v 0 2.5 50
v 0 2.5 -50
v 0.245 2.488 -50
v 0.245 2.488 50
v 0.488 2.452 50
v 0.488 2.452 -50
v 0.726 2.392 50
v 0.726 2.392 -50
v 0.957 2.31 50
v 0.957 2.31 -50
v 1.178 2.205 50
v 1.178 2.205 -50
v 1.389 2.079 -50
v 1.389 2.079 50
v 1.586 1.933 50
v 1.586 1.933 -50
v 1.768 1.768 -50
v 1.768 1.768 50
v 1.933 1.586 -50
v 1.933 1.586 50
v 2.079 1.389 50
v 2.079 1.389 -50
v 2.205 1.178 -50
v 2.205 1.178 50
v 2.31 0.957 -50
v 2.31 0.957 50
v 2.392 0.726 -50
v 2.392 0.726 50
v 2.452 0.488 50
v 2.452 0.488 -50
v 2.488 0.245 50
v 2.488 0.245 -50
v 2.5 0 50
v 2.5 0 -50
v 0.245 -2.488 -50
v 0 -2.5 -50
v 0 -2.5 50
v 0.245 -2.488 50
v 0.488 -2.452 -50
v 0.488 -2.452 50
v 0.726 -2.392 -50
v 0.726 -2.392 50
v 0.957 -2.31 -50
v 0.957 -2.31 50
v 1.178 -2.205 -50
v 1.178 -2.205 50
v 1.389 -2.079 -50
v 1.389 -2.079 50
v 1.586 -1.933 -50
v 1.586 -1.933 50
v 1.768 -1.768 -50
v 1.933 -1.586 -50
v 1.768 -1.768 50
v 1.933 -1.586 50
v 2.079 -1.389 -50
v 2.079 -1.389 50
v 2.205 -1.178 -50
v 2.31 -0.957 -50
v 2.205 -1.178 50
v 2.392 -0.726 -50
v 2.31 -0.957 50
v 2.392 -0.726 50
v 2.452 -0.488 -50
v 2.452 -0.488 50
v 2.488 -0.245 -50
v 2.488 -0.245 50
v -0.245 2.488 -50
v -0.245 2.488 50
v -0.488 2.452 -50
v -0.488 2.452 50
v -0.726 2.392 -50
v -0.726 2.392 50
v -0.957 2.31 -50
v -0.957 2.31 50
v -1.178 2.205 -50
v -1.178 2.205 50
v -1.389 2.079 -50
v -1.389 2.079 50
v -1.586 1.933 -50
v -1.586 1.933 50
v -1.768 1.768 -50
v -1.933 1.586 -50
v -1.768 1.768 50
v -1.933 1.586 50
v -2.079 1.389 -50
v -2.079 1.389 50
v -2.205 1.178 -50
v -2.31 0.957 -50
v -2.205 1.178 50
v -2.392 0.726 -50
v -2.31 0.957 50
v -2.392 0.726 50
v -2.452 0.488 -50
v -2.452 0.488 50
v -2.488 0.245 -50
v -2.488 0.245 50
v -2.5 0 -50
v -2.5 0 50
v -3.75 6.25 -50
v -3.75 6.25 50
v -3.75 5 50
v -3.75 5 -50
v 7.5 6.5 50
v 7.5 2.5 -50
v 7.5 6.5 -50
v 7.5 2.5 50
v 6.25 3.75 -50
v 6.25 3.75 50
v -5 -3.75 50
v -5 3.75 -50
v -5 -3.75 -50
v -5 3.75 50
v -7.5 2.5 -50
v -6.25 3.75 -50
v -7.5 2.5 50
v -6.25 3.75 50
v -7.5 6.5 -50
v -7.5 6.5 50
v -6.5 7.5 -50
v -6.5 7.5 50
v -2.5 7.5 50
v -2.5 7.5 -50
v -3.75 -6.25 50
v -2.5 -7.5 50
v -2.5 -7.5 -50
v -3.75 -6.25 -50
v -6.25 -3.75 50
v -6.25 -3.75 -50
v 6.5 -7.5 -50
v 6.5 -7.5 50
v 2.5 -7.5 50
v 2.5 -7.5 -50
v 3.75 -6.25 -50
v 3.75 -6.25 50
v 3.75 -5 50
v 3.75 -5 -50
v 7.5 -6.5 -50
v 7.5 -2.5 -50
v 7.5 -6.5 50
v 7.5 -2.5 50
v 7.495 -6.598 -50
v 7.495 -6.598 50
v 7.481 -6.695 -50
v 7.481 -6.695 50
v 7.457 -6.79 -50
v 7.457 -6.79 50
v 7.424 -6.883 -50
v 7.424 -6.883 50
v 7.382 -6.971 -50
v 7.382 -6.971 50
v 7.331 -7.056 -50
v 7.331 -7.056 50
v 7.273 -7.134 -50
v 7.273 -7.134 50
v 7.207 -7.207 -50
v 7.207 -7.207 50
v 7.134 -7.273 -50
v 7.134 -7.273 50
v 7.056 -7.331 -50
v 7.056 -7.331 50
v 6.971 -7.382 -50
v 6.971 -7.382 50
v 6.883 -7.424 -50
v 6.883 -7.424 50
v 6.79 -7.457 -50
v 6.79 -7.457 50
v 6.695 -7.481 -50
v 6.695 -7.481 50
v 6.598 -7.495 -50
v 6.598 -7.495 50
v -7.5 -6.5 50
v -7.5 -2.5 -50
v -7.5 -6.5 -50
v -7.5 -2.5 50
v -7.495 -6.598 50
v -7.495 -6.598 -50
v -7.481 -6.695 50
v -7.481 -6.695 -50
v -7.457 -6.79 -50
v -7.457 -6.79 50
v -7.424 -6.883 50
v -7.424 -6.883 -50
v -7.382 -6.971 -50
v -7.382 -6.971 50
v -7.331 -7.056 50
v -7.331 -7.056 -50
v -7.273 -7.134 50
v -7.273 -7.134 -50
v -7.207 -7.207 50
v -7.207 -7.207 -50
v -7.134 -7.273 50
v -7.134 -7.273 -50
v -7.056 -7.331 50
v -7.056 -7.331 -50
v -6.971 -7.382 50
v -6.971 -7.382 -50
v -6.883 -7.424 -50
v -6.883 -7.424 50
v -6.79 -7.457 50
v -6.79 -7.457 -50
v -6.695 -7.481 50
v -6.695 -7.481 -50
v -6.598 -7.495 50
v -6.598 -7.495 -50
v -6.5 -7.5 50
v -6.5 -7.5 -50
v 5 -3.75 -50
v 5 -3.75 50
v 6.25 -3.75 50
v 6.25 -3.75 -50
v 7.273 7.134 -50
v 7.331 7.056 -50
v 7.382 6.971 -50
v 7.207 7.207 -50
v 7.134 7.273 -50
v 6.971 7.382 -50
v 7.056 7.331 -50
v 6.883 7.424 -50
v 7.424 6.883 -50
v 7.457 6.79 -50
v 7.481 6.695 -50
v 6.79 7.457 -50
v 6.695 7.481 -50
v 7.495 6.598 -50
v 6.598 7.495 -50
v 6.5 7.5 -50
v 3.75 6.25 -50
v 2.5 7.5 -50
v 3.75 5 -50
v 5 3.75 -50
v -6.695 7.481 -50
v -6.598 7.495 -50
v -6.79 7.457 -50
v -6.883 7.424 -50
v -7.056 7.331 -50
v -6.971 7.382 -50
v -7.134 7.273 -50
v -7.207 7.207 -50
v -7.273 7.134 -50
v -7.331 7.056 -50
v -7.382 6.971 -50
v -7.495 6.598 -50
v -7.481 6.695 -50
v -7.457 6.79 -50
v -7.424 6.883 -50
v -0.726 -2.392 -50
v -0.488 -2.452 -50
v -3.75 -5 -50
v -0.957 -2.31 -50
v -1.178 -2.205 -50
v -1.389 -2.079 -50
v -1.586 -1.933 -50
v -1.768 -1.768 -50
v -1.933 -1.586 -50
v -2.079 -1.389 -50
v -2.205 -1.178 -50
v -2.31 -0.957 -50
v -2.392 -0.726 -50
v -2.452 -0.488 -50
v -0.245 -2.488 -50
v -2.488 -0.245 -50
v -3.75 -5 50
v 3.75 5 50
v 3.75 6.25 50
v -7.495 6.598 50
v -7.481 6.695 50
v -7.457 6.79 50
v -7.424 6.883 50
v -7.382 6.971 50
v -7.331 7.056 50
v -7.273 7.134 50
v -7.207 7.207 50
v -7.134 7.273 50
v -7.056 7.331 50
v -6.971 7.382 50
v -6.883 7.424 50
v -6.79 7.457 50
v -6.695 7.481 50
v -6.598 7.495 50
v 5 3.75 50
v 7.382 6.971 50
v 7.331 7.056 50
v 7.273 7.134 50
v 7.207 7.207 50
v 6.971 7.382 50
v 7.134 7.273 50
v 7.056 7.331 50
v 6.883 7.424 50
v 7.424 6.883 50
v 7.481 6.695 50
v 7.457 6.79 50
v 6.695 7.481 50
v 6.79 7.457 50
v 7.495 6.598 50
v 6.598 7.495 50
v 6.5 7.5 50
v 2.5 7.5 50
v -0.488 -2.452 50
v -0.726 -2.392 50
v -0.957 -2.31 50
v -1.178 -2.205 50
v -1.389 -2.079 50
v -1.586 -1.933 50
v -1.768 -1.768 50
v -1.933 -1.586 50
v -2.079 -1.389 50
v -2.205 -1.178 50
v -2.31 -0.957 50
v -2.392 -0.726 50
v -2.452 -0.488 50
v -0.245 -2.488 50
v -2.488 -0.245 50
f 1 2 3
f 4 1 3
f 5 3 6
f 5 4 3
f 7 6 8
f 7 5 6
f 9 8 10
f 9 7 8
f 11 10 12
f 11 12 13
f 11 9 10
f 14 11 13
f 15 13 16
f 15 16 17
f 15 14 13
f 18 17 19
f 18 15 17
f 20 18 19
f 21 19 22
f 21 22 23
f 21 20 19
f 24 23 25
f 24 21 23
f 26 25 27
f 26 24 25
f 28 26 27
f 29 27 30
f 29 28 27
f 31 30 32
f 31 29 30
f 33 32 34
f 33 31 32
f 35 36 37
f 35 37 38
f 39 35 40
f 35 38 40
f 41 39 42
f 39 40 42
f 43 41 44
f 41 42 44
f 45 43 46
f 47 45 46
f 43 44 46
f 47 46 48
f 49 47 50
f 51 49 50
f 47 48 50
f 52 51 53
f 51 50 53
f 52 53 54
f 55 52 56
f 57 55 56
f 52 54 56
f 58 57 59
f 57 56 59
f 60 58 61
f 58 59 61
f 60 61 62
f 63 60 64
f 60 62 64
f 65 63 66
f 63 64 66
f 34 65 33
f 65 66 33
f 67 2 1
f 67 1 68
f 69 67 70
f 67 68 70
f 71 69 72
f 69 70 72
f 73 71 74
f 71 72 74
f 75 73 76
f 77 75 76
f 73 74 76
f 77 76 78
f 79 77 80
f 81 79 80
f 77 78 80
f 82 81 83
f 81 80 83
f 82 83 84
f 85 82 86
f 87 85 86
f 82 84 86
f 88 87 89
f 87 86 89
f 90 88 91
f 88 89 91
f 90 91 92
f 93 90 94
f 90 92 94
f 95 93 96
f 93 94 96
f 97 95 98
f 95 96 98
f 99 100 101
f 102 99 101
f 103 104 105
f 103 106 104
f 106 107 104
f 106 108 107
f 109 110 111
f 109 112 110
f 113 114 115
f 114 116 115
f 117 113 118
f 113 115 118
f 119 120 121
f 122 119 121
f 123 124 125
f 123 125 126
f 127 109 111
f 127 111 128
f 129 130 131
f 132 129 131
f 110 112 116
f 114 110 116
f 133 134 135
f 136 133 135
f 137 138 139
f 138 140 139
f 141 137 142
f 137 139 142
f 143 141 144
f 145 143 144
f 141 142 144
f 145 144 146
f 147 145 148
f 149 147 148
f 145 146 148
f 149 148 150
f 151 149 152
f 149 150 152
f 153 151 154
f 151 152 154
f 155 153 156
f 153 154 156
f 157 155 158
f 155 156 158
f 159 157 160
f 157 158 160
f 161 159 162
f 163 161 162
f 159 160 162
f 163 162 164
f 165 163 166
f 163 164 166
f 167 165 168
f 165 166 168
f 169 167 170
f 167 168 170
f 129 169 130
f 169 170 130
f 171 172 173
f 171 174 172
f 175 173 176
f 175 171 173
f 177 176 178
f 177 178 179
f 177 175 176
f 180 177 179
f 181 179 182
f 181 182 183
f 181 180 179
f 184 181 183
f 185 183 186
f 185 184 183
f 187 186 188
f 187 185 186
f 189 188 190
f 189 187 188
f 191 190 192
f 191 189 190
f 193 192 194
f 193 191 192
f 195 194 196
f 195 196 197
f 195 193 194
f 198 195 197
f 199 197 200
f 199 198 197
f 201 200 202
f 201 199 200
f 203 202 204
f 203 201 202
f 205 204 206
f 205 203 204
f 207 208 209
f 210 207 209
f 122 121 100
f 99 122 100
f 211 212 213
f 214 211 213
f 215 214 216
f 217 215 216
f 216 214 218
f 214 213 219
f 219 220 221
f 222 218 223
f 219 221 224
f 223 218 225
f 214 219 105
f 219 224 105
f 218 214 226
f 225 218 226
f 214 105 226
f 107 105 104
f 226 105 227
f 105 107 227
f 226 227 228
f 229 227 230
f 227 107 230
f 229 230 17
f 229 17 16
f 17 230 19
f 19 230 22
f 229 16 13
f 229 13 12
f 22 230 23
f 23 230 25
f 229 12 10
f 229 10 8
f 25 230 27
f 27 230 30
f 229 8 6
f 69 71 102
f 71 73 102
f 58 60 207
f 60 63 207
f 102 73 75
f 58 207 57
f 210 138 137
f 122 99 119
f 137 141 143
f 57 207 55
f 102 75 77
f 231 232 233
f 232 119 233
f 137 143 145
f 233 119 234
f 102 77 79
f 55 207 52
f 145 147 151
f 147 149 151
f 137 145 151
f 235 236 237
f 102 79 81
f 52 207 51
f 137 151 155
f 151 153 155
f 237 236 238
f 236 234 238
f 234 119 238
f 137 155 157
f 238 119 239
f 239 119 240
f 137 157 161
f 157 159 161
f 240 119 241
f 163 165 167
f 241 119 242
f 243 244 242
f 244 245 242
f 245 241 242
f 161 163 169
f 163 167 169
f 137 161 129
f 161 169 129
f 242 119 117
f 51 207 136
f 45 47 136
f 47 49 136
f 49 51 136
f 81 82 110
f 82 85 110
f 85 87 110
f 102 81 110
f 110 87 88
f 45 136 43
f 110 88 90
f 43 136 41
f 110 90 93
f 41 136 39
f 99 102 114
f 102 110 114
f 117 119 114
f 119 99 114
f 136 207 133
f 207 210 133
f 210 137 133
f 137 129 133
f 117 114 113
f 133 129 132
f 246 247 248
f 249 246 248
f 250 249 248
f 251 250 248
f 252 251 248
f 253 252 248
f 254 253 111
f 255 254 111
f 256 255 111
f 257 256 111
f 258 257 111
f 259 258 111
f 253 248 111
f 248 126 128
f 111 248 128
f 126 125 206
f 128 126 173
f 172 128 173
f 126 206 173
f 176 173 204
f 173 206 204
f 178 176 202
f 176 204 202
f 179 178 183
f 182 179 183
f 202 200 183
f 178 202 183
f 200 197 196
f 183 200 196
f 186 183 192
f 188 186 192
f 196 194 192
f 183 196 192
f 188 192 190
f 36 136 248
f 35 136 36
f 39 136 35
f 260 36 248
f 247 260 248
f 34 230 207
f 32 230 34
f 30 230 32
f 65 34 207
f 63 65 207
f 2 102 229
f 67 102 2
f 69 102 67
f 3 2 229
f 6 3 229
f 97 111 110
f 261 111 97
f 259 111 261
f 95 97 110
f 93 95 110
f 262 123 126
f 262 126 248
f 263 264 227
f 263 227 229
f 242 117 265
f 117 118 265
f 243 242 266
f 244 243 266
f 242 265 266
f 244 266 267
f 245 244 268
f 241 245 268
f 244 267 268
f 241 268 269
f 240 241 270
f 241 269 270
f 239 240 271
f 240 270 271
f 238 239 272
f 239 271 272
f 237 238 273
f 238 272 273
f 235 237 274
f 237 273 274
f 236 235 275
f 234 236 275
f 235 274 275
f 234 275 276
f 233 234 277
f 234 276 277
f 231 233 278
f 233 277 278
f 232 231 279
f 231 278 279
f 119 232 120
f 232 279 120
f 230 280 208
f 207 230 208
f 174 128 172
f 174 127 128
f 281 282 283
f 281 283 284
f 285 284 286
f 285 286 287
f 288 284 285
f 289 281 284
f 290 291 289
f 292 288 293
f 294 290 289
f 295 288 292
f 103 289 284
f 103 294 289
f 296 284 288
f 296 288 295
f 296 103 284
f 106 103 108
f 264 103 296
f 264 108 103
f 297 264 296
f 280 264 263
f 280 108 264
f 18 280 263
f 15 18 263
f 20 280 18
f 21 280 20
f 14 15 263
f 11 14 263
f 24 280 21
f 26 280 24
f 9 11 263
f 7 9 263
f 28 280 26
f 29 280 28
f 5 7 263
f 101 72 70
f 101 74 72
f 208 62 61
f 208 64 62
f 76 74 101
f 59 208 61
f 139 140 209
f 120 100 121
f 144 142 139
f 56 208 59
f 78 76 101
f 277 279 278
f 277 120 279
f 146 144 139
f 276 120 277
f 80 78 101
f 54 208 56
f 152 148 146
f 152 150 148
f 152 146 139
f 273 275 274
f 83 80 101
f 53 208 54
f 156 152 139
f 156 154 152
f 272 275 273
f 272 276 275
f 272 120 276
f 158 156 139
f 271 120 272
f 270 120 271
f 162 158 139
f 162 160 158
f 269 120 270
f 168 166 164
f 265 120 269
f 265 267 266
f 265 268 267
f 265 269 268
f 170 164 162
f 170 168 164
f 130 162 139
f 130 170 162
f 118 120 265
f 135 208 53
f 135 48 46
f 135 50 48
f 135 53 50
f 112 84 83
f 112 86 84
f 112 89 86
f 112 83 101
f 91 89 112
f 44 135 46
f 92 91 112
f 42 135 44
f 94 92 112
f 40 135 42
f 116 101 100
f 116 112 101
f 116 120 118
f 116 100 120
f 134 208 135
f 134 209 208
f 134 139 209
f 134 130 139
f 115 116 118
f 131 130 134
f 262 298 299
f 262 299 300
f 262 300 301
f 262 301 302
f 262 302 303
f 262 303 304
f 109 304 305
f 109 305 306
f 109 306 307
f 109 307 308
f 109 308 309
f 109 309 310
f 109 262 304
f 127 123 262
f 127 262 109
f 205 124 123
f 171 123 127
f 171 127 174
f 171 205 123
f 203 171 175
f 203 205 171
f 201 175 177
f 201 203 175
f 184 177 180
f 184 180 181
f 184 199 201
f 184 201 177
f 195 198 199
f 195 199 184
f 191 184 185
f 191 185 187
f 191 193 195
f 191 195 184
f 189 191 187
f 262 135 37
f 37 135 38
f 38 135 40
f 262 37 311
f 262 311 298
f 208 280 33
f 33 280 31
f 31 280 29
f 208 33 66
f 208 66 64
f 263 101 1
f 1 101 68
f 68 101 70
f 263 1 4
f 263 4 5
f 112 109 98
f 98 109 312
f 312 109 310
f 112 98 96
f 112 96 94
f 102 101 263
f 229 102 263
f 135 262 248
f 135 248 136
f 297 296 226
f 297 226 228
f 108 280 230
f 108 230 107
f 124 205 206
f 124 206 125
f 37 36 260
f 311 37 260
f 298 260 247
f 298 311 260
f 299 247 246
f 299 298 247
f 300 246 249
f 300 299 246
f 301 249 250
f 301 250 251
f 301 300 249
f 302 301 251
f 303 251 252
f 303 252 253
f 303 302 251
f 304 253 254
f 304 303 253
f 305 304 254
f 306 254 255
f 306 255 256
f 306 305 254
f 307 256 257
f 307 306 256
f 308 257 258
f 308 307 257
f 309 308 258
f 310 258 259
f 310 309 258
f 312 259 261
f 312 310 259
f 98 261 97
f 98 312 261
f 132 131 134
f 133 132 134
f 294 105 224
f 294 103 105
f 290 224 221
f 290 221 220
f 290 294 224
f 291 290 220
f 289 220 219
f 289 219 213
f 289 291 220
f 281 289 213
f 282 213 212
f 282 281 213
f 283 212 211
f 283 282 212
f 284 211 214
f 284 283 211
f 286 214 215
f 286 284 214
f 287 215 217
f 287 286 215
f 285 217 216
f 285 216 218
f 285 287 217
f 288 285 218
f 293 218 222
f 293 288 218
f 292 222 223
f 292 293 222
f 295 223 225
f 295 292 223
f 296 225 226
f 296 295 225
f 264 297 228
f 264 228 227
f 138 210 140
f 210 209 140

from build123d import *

# Parameters (mm, degrees)
F2_DEPTH = 50


with BuildPart() as f2:
    # F0 (on Top) → F2 (new body, symmetric)
    with BuildSketch(Plane.XY):
        with BuildLine():
            ThreePointArc((7.5, 6.5), (7.2071067812, 7.2071067812), (6.5, 7.5))
            Line((6.5, 7.5), (2.5, 7.5))
            Line((2.5, 7.5), (3.75, 6.25))
            Line((3.75, 6.25), (3.75, 5))
            Line((3.75, 5), (0, 5))
            Line((0, 5), (0, 2.5))
            ThreePointArc((0, 2.5), (1.767766953, 1.767766953), (2.5, 0))
            Line((2.5, 0), (5, 0))
            Line((5, 0), (5, 3.75))
            Line((5, 3.75), (6.25, 3.75))
            Line((6.25, 3.75), (7.5, 2.5))
            Line((7.5, 2.5), (7.5, 6.5))
        make_face()
    extrude(amount=F2_DEPTH, both=True)

    # F3: F2 across plane


with BuildPart() as f2_1:
    add(f2.part)
    add(f2.part.mirror(Plane.YZ))

    # F4: F2 across plane


with BuildPart() as f2_2:
    add(f2_1.part)
    add(f2_1.part.mirror(Plane.XZ))


solid = f2_2.part
